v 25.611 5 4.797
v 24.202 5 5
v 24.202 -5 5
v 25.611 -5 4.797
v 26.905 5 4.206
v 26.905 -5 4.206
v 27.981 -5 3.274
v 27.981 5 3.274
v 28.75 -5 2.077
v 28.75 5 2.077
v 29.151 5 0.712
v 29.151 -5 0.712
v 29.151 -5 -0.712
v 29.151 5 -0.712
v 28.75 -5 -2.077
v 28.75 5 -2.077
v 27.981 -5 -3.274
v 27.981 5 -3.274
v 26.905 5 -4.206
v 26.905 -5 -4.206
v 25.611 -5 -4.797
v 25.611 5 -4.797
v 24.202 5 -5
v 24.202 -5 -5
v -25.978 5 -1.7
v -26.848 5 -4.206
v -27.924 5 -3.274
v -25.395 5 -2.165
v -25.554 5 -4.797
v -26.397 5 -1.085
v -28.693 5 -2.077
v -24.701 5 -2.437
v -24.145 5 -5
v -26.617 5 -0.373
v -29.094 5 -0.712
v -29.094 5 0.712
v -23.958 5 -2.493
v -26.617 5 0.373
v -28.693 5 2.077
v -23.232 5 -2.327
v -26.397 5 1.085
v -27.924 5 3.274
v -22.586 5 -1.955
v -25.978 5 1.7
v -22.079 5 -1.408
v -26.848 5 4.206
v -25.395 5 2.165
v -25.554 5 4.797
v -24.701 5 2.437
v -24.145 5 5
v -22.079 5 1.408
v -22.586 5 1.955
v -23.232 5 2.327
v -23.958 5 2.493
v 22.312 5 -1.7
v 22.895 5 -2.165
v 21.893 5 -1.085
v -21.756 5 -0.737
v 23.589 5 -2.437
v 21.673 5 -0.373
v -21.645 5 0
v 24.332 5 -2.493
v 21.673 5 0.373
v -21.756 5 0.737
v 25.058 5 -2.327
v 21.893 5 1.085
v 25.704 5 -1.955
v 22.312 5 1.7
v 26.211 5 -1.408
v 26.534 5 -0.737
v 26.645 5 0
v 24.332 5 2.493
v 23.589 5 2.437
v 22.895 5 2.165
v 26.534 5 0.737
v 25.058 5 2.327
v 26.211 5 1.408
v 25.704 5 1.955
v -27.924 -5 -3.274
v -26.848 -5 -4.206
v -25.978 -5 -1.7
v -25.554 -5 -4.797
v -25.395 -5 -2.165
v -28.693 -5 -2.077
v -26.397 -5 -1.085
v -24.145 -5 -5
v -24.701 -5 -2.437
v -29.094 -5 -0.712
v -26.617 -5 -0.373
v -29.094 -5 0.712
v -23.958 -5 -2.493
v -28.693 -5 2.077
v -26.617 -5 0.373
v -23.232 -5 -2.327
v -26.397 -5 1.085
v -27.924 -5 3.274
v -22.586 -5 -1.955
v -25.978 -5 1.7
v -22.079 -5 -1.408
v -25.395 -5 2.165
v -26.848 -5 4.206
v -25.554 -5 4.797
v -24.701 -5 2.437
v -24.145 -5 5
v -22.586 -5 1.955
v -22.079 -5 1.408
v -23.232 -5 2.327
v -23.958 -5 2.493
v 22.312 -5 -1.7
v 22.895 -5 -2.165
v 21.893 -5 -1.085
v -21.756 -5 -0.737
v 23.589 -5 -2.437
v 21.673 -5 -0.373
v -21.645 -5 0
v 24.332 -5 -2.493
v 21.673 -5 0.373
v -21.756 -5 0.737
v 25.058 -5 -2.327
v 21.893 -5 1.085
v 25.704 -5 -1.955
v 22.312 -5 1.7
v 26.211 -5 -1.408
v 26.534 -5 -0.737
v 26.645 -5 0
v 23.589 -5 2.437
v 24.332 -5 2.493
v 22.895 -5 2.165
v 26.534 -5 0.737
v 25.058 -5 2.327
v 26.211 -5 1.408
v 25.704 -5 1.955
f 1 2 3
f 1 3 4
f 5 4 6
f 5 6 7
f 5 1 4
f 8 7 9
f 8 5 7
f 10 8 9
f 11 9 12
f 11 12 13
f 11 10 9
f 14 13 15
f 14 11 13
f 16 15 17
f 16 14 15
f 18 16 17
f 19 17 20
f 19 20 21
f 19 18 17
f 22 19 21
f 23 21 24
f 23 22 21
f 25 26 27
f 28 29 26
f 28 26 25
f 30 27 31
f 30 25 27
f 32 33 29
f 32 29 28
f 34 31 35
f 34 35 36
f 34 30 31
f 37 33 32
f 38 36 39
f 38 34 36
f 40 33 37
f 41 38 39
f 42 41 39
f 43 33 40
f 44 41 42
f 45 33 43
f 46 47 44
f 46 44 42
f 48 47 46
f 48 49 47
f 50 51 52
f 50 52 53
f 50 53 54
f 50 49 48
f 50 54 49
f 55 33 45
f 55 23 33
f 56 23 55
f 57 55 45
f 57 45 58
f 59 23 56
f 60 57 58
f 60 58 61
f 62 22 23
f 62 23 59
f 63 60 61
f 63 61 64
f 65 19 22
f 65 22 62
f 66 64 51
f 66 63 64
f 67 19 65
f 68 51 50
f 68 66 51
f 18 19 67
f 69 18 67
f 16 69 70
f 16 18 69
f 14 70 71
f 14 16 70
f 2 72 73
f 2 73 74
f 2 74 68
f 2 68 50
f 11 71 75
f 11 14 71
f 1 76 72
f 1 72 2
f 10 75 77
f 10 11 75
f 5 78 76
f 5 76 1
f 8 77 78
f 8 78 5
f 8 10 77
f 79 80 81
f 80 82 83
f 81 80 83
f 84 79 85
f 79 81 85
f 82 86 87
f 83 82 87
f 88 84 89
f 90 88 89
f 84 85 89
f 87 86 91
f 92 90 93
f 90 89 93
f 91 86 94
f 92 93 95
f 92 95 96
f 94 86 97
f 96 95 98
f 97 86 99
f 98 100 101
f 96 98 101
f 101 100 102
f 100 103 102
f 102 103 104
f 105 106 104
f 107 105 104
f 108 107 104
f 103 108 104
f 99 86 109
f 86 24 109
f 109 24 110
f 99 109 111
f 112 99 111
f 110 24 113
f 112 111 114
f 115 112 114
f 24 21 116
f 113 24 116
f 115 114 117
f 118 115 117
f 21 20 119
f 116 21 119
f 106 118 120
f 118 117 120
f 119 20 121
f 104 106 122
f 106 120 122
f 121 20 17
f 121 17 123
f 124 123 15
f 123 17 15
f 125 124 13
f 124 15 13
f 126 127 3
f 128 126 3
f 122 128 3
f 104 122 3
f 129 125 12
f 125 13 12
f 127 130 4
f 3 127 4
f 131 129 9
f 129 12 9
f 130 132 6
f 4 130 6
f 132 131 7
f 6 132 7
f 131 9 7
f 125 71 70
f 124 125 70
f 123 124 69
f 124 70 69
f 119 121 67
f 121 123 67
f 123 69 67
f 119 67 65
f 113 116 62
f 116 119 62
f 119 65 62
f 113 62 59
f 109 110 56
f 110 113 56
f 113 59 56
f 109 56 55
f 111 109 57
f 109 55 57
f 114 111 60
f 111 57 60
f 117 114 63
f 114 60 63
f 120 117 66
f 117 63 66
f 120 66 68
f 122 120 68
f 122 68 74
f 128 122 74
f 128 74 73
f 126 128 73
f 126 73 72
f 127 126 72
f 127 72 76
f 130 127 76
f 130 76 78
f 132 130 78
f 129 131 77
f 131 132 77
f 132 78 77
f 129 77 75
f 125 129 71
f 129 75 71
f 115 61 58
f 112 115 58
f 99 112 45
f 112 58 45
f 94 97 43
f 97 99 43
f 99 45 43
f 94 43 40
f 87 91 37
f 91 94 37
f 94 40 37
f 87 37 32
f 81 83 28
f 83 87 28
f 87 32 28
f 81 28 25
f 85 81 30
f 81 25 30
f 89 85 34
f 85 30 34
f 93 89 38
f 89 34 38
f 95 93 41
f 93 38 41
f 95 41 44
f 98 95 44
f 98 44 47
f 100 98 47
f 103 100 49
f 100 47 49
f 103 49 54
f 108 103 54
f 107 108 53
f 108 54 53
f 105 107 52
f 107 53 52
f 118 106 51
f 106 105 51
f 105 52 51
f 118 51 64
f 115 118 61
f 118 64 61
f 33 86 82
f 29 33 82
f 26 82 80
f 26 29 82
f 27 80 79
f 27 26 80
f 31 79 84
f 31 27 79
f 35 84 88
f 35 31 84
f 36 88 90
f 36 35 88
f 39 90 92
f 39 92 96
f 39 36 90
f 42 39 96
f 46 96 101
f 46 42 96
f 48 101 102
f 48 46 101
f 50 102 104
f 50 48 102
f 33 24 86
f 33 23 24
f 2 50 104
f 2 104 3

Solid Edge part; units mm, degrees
sketch "Sketch1" plane through (0, 0, 0) normal (0, -1, 0) x (1, 0, 0)
  arc A0 (-24.145, -5) -> (-24.145, 5) centre (-24.145, 0) cw
  line L0 (-24.145, 5) -> (24.2019, 5)
  arc A1 (24.2019, 5) -> (24.2019, -5) centre (24.2019, 0) cw
  line L1 (24.2019, -5) -> (-24.145, -5)
  circle A2 centre (24.145, 0) radius 2.5
  circle A3 centre (-24.145, 0) radius 2.5
  dimension "D1" = 5
  dimension "D2" = 5
  dimension "D3" = 48.29
  dimension "D4" = 24.145
  dimension "D5" = 10
  dimension "D6" = 10
extrude "Protrusion1" add sketch "Sketch1" along normal mid plane 10
